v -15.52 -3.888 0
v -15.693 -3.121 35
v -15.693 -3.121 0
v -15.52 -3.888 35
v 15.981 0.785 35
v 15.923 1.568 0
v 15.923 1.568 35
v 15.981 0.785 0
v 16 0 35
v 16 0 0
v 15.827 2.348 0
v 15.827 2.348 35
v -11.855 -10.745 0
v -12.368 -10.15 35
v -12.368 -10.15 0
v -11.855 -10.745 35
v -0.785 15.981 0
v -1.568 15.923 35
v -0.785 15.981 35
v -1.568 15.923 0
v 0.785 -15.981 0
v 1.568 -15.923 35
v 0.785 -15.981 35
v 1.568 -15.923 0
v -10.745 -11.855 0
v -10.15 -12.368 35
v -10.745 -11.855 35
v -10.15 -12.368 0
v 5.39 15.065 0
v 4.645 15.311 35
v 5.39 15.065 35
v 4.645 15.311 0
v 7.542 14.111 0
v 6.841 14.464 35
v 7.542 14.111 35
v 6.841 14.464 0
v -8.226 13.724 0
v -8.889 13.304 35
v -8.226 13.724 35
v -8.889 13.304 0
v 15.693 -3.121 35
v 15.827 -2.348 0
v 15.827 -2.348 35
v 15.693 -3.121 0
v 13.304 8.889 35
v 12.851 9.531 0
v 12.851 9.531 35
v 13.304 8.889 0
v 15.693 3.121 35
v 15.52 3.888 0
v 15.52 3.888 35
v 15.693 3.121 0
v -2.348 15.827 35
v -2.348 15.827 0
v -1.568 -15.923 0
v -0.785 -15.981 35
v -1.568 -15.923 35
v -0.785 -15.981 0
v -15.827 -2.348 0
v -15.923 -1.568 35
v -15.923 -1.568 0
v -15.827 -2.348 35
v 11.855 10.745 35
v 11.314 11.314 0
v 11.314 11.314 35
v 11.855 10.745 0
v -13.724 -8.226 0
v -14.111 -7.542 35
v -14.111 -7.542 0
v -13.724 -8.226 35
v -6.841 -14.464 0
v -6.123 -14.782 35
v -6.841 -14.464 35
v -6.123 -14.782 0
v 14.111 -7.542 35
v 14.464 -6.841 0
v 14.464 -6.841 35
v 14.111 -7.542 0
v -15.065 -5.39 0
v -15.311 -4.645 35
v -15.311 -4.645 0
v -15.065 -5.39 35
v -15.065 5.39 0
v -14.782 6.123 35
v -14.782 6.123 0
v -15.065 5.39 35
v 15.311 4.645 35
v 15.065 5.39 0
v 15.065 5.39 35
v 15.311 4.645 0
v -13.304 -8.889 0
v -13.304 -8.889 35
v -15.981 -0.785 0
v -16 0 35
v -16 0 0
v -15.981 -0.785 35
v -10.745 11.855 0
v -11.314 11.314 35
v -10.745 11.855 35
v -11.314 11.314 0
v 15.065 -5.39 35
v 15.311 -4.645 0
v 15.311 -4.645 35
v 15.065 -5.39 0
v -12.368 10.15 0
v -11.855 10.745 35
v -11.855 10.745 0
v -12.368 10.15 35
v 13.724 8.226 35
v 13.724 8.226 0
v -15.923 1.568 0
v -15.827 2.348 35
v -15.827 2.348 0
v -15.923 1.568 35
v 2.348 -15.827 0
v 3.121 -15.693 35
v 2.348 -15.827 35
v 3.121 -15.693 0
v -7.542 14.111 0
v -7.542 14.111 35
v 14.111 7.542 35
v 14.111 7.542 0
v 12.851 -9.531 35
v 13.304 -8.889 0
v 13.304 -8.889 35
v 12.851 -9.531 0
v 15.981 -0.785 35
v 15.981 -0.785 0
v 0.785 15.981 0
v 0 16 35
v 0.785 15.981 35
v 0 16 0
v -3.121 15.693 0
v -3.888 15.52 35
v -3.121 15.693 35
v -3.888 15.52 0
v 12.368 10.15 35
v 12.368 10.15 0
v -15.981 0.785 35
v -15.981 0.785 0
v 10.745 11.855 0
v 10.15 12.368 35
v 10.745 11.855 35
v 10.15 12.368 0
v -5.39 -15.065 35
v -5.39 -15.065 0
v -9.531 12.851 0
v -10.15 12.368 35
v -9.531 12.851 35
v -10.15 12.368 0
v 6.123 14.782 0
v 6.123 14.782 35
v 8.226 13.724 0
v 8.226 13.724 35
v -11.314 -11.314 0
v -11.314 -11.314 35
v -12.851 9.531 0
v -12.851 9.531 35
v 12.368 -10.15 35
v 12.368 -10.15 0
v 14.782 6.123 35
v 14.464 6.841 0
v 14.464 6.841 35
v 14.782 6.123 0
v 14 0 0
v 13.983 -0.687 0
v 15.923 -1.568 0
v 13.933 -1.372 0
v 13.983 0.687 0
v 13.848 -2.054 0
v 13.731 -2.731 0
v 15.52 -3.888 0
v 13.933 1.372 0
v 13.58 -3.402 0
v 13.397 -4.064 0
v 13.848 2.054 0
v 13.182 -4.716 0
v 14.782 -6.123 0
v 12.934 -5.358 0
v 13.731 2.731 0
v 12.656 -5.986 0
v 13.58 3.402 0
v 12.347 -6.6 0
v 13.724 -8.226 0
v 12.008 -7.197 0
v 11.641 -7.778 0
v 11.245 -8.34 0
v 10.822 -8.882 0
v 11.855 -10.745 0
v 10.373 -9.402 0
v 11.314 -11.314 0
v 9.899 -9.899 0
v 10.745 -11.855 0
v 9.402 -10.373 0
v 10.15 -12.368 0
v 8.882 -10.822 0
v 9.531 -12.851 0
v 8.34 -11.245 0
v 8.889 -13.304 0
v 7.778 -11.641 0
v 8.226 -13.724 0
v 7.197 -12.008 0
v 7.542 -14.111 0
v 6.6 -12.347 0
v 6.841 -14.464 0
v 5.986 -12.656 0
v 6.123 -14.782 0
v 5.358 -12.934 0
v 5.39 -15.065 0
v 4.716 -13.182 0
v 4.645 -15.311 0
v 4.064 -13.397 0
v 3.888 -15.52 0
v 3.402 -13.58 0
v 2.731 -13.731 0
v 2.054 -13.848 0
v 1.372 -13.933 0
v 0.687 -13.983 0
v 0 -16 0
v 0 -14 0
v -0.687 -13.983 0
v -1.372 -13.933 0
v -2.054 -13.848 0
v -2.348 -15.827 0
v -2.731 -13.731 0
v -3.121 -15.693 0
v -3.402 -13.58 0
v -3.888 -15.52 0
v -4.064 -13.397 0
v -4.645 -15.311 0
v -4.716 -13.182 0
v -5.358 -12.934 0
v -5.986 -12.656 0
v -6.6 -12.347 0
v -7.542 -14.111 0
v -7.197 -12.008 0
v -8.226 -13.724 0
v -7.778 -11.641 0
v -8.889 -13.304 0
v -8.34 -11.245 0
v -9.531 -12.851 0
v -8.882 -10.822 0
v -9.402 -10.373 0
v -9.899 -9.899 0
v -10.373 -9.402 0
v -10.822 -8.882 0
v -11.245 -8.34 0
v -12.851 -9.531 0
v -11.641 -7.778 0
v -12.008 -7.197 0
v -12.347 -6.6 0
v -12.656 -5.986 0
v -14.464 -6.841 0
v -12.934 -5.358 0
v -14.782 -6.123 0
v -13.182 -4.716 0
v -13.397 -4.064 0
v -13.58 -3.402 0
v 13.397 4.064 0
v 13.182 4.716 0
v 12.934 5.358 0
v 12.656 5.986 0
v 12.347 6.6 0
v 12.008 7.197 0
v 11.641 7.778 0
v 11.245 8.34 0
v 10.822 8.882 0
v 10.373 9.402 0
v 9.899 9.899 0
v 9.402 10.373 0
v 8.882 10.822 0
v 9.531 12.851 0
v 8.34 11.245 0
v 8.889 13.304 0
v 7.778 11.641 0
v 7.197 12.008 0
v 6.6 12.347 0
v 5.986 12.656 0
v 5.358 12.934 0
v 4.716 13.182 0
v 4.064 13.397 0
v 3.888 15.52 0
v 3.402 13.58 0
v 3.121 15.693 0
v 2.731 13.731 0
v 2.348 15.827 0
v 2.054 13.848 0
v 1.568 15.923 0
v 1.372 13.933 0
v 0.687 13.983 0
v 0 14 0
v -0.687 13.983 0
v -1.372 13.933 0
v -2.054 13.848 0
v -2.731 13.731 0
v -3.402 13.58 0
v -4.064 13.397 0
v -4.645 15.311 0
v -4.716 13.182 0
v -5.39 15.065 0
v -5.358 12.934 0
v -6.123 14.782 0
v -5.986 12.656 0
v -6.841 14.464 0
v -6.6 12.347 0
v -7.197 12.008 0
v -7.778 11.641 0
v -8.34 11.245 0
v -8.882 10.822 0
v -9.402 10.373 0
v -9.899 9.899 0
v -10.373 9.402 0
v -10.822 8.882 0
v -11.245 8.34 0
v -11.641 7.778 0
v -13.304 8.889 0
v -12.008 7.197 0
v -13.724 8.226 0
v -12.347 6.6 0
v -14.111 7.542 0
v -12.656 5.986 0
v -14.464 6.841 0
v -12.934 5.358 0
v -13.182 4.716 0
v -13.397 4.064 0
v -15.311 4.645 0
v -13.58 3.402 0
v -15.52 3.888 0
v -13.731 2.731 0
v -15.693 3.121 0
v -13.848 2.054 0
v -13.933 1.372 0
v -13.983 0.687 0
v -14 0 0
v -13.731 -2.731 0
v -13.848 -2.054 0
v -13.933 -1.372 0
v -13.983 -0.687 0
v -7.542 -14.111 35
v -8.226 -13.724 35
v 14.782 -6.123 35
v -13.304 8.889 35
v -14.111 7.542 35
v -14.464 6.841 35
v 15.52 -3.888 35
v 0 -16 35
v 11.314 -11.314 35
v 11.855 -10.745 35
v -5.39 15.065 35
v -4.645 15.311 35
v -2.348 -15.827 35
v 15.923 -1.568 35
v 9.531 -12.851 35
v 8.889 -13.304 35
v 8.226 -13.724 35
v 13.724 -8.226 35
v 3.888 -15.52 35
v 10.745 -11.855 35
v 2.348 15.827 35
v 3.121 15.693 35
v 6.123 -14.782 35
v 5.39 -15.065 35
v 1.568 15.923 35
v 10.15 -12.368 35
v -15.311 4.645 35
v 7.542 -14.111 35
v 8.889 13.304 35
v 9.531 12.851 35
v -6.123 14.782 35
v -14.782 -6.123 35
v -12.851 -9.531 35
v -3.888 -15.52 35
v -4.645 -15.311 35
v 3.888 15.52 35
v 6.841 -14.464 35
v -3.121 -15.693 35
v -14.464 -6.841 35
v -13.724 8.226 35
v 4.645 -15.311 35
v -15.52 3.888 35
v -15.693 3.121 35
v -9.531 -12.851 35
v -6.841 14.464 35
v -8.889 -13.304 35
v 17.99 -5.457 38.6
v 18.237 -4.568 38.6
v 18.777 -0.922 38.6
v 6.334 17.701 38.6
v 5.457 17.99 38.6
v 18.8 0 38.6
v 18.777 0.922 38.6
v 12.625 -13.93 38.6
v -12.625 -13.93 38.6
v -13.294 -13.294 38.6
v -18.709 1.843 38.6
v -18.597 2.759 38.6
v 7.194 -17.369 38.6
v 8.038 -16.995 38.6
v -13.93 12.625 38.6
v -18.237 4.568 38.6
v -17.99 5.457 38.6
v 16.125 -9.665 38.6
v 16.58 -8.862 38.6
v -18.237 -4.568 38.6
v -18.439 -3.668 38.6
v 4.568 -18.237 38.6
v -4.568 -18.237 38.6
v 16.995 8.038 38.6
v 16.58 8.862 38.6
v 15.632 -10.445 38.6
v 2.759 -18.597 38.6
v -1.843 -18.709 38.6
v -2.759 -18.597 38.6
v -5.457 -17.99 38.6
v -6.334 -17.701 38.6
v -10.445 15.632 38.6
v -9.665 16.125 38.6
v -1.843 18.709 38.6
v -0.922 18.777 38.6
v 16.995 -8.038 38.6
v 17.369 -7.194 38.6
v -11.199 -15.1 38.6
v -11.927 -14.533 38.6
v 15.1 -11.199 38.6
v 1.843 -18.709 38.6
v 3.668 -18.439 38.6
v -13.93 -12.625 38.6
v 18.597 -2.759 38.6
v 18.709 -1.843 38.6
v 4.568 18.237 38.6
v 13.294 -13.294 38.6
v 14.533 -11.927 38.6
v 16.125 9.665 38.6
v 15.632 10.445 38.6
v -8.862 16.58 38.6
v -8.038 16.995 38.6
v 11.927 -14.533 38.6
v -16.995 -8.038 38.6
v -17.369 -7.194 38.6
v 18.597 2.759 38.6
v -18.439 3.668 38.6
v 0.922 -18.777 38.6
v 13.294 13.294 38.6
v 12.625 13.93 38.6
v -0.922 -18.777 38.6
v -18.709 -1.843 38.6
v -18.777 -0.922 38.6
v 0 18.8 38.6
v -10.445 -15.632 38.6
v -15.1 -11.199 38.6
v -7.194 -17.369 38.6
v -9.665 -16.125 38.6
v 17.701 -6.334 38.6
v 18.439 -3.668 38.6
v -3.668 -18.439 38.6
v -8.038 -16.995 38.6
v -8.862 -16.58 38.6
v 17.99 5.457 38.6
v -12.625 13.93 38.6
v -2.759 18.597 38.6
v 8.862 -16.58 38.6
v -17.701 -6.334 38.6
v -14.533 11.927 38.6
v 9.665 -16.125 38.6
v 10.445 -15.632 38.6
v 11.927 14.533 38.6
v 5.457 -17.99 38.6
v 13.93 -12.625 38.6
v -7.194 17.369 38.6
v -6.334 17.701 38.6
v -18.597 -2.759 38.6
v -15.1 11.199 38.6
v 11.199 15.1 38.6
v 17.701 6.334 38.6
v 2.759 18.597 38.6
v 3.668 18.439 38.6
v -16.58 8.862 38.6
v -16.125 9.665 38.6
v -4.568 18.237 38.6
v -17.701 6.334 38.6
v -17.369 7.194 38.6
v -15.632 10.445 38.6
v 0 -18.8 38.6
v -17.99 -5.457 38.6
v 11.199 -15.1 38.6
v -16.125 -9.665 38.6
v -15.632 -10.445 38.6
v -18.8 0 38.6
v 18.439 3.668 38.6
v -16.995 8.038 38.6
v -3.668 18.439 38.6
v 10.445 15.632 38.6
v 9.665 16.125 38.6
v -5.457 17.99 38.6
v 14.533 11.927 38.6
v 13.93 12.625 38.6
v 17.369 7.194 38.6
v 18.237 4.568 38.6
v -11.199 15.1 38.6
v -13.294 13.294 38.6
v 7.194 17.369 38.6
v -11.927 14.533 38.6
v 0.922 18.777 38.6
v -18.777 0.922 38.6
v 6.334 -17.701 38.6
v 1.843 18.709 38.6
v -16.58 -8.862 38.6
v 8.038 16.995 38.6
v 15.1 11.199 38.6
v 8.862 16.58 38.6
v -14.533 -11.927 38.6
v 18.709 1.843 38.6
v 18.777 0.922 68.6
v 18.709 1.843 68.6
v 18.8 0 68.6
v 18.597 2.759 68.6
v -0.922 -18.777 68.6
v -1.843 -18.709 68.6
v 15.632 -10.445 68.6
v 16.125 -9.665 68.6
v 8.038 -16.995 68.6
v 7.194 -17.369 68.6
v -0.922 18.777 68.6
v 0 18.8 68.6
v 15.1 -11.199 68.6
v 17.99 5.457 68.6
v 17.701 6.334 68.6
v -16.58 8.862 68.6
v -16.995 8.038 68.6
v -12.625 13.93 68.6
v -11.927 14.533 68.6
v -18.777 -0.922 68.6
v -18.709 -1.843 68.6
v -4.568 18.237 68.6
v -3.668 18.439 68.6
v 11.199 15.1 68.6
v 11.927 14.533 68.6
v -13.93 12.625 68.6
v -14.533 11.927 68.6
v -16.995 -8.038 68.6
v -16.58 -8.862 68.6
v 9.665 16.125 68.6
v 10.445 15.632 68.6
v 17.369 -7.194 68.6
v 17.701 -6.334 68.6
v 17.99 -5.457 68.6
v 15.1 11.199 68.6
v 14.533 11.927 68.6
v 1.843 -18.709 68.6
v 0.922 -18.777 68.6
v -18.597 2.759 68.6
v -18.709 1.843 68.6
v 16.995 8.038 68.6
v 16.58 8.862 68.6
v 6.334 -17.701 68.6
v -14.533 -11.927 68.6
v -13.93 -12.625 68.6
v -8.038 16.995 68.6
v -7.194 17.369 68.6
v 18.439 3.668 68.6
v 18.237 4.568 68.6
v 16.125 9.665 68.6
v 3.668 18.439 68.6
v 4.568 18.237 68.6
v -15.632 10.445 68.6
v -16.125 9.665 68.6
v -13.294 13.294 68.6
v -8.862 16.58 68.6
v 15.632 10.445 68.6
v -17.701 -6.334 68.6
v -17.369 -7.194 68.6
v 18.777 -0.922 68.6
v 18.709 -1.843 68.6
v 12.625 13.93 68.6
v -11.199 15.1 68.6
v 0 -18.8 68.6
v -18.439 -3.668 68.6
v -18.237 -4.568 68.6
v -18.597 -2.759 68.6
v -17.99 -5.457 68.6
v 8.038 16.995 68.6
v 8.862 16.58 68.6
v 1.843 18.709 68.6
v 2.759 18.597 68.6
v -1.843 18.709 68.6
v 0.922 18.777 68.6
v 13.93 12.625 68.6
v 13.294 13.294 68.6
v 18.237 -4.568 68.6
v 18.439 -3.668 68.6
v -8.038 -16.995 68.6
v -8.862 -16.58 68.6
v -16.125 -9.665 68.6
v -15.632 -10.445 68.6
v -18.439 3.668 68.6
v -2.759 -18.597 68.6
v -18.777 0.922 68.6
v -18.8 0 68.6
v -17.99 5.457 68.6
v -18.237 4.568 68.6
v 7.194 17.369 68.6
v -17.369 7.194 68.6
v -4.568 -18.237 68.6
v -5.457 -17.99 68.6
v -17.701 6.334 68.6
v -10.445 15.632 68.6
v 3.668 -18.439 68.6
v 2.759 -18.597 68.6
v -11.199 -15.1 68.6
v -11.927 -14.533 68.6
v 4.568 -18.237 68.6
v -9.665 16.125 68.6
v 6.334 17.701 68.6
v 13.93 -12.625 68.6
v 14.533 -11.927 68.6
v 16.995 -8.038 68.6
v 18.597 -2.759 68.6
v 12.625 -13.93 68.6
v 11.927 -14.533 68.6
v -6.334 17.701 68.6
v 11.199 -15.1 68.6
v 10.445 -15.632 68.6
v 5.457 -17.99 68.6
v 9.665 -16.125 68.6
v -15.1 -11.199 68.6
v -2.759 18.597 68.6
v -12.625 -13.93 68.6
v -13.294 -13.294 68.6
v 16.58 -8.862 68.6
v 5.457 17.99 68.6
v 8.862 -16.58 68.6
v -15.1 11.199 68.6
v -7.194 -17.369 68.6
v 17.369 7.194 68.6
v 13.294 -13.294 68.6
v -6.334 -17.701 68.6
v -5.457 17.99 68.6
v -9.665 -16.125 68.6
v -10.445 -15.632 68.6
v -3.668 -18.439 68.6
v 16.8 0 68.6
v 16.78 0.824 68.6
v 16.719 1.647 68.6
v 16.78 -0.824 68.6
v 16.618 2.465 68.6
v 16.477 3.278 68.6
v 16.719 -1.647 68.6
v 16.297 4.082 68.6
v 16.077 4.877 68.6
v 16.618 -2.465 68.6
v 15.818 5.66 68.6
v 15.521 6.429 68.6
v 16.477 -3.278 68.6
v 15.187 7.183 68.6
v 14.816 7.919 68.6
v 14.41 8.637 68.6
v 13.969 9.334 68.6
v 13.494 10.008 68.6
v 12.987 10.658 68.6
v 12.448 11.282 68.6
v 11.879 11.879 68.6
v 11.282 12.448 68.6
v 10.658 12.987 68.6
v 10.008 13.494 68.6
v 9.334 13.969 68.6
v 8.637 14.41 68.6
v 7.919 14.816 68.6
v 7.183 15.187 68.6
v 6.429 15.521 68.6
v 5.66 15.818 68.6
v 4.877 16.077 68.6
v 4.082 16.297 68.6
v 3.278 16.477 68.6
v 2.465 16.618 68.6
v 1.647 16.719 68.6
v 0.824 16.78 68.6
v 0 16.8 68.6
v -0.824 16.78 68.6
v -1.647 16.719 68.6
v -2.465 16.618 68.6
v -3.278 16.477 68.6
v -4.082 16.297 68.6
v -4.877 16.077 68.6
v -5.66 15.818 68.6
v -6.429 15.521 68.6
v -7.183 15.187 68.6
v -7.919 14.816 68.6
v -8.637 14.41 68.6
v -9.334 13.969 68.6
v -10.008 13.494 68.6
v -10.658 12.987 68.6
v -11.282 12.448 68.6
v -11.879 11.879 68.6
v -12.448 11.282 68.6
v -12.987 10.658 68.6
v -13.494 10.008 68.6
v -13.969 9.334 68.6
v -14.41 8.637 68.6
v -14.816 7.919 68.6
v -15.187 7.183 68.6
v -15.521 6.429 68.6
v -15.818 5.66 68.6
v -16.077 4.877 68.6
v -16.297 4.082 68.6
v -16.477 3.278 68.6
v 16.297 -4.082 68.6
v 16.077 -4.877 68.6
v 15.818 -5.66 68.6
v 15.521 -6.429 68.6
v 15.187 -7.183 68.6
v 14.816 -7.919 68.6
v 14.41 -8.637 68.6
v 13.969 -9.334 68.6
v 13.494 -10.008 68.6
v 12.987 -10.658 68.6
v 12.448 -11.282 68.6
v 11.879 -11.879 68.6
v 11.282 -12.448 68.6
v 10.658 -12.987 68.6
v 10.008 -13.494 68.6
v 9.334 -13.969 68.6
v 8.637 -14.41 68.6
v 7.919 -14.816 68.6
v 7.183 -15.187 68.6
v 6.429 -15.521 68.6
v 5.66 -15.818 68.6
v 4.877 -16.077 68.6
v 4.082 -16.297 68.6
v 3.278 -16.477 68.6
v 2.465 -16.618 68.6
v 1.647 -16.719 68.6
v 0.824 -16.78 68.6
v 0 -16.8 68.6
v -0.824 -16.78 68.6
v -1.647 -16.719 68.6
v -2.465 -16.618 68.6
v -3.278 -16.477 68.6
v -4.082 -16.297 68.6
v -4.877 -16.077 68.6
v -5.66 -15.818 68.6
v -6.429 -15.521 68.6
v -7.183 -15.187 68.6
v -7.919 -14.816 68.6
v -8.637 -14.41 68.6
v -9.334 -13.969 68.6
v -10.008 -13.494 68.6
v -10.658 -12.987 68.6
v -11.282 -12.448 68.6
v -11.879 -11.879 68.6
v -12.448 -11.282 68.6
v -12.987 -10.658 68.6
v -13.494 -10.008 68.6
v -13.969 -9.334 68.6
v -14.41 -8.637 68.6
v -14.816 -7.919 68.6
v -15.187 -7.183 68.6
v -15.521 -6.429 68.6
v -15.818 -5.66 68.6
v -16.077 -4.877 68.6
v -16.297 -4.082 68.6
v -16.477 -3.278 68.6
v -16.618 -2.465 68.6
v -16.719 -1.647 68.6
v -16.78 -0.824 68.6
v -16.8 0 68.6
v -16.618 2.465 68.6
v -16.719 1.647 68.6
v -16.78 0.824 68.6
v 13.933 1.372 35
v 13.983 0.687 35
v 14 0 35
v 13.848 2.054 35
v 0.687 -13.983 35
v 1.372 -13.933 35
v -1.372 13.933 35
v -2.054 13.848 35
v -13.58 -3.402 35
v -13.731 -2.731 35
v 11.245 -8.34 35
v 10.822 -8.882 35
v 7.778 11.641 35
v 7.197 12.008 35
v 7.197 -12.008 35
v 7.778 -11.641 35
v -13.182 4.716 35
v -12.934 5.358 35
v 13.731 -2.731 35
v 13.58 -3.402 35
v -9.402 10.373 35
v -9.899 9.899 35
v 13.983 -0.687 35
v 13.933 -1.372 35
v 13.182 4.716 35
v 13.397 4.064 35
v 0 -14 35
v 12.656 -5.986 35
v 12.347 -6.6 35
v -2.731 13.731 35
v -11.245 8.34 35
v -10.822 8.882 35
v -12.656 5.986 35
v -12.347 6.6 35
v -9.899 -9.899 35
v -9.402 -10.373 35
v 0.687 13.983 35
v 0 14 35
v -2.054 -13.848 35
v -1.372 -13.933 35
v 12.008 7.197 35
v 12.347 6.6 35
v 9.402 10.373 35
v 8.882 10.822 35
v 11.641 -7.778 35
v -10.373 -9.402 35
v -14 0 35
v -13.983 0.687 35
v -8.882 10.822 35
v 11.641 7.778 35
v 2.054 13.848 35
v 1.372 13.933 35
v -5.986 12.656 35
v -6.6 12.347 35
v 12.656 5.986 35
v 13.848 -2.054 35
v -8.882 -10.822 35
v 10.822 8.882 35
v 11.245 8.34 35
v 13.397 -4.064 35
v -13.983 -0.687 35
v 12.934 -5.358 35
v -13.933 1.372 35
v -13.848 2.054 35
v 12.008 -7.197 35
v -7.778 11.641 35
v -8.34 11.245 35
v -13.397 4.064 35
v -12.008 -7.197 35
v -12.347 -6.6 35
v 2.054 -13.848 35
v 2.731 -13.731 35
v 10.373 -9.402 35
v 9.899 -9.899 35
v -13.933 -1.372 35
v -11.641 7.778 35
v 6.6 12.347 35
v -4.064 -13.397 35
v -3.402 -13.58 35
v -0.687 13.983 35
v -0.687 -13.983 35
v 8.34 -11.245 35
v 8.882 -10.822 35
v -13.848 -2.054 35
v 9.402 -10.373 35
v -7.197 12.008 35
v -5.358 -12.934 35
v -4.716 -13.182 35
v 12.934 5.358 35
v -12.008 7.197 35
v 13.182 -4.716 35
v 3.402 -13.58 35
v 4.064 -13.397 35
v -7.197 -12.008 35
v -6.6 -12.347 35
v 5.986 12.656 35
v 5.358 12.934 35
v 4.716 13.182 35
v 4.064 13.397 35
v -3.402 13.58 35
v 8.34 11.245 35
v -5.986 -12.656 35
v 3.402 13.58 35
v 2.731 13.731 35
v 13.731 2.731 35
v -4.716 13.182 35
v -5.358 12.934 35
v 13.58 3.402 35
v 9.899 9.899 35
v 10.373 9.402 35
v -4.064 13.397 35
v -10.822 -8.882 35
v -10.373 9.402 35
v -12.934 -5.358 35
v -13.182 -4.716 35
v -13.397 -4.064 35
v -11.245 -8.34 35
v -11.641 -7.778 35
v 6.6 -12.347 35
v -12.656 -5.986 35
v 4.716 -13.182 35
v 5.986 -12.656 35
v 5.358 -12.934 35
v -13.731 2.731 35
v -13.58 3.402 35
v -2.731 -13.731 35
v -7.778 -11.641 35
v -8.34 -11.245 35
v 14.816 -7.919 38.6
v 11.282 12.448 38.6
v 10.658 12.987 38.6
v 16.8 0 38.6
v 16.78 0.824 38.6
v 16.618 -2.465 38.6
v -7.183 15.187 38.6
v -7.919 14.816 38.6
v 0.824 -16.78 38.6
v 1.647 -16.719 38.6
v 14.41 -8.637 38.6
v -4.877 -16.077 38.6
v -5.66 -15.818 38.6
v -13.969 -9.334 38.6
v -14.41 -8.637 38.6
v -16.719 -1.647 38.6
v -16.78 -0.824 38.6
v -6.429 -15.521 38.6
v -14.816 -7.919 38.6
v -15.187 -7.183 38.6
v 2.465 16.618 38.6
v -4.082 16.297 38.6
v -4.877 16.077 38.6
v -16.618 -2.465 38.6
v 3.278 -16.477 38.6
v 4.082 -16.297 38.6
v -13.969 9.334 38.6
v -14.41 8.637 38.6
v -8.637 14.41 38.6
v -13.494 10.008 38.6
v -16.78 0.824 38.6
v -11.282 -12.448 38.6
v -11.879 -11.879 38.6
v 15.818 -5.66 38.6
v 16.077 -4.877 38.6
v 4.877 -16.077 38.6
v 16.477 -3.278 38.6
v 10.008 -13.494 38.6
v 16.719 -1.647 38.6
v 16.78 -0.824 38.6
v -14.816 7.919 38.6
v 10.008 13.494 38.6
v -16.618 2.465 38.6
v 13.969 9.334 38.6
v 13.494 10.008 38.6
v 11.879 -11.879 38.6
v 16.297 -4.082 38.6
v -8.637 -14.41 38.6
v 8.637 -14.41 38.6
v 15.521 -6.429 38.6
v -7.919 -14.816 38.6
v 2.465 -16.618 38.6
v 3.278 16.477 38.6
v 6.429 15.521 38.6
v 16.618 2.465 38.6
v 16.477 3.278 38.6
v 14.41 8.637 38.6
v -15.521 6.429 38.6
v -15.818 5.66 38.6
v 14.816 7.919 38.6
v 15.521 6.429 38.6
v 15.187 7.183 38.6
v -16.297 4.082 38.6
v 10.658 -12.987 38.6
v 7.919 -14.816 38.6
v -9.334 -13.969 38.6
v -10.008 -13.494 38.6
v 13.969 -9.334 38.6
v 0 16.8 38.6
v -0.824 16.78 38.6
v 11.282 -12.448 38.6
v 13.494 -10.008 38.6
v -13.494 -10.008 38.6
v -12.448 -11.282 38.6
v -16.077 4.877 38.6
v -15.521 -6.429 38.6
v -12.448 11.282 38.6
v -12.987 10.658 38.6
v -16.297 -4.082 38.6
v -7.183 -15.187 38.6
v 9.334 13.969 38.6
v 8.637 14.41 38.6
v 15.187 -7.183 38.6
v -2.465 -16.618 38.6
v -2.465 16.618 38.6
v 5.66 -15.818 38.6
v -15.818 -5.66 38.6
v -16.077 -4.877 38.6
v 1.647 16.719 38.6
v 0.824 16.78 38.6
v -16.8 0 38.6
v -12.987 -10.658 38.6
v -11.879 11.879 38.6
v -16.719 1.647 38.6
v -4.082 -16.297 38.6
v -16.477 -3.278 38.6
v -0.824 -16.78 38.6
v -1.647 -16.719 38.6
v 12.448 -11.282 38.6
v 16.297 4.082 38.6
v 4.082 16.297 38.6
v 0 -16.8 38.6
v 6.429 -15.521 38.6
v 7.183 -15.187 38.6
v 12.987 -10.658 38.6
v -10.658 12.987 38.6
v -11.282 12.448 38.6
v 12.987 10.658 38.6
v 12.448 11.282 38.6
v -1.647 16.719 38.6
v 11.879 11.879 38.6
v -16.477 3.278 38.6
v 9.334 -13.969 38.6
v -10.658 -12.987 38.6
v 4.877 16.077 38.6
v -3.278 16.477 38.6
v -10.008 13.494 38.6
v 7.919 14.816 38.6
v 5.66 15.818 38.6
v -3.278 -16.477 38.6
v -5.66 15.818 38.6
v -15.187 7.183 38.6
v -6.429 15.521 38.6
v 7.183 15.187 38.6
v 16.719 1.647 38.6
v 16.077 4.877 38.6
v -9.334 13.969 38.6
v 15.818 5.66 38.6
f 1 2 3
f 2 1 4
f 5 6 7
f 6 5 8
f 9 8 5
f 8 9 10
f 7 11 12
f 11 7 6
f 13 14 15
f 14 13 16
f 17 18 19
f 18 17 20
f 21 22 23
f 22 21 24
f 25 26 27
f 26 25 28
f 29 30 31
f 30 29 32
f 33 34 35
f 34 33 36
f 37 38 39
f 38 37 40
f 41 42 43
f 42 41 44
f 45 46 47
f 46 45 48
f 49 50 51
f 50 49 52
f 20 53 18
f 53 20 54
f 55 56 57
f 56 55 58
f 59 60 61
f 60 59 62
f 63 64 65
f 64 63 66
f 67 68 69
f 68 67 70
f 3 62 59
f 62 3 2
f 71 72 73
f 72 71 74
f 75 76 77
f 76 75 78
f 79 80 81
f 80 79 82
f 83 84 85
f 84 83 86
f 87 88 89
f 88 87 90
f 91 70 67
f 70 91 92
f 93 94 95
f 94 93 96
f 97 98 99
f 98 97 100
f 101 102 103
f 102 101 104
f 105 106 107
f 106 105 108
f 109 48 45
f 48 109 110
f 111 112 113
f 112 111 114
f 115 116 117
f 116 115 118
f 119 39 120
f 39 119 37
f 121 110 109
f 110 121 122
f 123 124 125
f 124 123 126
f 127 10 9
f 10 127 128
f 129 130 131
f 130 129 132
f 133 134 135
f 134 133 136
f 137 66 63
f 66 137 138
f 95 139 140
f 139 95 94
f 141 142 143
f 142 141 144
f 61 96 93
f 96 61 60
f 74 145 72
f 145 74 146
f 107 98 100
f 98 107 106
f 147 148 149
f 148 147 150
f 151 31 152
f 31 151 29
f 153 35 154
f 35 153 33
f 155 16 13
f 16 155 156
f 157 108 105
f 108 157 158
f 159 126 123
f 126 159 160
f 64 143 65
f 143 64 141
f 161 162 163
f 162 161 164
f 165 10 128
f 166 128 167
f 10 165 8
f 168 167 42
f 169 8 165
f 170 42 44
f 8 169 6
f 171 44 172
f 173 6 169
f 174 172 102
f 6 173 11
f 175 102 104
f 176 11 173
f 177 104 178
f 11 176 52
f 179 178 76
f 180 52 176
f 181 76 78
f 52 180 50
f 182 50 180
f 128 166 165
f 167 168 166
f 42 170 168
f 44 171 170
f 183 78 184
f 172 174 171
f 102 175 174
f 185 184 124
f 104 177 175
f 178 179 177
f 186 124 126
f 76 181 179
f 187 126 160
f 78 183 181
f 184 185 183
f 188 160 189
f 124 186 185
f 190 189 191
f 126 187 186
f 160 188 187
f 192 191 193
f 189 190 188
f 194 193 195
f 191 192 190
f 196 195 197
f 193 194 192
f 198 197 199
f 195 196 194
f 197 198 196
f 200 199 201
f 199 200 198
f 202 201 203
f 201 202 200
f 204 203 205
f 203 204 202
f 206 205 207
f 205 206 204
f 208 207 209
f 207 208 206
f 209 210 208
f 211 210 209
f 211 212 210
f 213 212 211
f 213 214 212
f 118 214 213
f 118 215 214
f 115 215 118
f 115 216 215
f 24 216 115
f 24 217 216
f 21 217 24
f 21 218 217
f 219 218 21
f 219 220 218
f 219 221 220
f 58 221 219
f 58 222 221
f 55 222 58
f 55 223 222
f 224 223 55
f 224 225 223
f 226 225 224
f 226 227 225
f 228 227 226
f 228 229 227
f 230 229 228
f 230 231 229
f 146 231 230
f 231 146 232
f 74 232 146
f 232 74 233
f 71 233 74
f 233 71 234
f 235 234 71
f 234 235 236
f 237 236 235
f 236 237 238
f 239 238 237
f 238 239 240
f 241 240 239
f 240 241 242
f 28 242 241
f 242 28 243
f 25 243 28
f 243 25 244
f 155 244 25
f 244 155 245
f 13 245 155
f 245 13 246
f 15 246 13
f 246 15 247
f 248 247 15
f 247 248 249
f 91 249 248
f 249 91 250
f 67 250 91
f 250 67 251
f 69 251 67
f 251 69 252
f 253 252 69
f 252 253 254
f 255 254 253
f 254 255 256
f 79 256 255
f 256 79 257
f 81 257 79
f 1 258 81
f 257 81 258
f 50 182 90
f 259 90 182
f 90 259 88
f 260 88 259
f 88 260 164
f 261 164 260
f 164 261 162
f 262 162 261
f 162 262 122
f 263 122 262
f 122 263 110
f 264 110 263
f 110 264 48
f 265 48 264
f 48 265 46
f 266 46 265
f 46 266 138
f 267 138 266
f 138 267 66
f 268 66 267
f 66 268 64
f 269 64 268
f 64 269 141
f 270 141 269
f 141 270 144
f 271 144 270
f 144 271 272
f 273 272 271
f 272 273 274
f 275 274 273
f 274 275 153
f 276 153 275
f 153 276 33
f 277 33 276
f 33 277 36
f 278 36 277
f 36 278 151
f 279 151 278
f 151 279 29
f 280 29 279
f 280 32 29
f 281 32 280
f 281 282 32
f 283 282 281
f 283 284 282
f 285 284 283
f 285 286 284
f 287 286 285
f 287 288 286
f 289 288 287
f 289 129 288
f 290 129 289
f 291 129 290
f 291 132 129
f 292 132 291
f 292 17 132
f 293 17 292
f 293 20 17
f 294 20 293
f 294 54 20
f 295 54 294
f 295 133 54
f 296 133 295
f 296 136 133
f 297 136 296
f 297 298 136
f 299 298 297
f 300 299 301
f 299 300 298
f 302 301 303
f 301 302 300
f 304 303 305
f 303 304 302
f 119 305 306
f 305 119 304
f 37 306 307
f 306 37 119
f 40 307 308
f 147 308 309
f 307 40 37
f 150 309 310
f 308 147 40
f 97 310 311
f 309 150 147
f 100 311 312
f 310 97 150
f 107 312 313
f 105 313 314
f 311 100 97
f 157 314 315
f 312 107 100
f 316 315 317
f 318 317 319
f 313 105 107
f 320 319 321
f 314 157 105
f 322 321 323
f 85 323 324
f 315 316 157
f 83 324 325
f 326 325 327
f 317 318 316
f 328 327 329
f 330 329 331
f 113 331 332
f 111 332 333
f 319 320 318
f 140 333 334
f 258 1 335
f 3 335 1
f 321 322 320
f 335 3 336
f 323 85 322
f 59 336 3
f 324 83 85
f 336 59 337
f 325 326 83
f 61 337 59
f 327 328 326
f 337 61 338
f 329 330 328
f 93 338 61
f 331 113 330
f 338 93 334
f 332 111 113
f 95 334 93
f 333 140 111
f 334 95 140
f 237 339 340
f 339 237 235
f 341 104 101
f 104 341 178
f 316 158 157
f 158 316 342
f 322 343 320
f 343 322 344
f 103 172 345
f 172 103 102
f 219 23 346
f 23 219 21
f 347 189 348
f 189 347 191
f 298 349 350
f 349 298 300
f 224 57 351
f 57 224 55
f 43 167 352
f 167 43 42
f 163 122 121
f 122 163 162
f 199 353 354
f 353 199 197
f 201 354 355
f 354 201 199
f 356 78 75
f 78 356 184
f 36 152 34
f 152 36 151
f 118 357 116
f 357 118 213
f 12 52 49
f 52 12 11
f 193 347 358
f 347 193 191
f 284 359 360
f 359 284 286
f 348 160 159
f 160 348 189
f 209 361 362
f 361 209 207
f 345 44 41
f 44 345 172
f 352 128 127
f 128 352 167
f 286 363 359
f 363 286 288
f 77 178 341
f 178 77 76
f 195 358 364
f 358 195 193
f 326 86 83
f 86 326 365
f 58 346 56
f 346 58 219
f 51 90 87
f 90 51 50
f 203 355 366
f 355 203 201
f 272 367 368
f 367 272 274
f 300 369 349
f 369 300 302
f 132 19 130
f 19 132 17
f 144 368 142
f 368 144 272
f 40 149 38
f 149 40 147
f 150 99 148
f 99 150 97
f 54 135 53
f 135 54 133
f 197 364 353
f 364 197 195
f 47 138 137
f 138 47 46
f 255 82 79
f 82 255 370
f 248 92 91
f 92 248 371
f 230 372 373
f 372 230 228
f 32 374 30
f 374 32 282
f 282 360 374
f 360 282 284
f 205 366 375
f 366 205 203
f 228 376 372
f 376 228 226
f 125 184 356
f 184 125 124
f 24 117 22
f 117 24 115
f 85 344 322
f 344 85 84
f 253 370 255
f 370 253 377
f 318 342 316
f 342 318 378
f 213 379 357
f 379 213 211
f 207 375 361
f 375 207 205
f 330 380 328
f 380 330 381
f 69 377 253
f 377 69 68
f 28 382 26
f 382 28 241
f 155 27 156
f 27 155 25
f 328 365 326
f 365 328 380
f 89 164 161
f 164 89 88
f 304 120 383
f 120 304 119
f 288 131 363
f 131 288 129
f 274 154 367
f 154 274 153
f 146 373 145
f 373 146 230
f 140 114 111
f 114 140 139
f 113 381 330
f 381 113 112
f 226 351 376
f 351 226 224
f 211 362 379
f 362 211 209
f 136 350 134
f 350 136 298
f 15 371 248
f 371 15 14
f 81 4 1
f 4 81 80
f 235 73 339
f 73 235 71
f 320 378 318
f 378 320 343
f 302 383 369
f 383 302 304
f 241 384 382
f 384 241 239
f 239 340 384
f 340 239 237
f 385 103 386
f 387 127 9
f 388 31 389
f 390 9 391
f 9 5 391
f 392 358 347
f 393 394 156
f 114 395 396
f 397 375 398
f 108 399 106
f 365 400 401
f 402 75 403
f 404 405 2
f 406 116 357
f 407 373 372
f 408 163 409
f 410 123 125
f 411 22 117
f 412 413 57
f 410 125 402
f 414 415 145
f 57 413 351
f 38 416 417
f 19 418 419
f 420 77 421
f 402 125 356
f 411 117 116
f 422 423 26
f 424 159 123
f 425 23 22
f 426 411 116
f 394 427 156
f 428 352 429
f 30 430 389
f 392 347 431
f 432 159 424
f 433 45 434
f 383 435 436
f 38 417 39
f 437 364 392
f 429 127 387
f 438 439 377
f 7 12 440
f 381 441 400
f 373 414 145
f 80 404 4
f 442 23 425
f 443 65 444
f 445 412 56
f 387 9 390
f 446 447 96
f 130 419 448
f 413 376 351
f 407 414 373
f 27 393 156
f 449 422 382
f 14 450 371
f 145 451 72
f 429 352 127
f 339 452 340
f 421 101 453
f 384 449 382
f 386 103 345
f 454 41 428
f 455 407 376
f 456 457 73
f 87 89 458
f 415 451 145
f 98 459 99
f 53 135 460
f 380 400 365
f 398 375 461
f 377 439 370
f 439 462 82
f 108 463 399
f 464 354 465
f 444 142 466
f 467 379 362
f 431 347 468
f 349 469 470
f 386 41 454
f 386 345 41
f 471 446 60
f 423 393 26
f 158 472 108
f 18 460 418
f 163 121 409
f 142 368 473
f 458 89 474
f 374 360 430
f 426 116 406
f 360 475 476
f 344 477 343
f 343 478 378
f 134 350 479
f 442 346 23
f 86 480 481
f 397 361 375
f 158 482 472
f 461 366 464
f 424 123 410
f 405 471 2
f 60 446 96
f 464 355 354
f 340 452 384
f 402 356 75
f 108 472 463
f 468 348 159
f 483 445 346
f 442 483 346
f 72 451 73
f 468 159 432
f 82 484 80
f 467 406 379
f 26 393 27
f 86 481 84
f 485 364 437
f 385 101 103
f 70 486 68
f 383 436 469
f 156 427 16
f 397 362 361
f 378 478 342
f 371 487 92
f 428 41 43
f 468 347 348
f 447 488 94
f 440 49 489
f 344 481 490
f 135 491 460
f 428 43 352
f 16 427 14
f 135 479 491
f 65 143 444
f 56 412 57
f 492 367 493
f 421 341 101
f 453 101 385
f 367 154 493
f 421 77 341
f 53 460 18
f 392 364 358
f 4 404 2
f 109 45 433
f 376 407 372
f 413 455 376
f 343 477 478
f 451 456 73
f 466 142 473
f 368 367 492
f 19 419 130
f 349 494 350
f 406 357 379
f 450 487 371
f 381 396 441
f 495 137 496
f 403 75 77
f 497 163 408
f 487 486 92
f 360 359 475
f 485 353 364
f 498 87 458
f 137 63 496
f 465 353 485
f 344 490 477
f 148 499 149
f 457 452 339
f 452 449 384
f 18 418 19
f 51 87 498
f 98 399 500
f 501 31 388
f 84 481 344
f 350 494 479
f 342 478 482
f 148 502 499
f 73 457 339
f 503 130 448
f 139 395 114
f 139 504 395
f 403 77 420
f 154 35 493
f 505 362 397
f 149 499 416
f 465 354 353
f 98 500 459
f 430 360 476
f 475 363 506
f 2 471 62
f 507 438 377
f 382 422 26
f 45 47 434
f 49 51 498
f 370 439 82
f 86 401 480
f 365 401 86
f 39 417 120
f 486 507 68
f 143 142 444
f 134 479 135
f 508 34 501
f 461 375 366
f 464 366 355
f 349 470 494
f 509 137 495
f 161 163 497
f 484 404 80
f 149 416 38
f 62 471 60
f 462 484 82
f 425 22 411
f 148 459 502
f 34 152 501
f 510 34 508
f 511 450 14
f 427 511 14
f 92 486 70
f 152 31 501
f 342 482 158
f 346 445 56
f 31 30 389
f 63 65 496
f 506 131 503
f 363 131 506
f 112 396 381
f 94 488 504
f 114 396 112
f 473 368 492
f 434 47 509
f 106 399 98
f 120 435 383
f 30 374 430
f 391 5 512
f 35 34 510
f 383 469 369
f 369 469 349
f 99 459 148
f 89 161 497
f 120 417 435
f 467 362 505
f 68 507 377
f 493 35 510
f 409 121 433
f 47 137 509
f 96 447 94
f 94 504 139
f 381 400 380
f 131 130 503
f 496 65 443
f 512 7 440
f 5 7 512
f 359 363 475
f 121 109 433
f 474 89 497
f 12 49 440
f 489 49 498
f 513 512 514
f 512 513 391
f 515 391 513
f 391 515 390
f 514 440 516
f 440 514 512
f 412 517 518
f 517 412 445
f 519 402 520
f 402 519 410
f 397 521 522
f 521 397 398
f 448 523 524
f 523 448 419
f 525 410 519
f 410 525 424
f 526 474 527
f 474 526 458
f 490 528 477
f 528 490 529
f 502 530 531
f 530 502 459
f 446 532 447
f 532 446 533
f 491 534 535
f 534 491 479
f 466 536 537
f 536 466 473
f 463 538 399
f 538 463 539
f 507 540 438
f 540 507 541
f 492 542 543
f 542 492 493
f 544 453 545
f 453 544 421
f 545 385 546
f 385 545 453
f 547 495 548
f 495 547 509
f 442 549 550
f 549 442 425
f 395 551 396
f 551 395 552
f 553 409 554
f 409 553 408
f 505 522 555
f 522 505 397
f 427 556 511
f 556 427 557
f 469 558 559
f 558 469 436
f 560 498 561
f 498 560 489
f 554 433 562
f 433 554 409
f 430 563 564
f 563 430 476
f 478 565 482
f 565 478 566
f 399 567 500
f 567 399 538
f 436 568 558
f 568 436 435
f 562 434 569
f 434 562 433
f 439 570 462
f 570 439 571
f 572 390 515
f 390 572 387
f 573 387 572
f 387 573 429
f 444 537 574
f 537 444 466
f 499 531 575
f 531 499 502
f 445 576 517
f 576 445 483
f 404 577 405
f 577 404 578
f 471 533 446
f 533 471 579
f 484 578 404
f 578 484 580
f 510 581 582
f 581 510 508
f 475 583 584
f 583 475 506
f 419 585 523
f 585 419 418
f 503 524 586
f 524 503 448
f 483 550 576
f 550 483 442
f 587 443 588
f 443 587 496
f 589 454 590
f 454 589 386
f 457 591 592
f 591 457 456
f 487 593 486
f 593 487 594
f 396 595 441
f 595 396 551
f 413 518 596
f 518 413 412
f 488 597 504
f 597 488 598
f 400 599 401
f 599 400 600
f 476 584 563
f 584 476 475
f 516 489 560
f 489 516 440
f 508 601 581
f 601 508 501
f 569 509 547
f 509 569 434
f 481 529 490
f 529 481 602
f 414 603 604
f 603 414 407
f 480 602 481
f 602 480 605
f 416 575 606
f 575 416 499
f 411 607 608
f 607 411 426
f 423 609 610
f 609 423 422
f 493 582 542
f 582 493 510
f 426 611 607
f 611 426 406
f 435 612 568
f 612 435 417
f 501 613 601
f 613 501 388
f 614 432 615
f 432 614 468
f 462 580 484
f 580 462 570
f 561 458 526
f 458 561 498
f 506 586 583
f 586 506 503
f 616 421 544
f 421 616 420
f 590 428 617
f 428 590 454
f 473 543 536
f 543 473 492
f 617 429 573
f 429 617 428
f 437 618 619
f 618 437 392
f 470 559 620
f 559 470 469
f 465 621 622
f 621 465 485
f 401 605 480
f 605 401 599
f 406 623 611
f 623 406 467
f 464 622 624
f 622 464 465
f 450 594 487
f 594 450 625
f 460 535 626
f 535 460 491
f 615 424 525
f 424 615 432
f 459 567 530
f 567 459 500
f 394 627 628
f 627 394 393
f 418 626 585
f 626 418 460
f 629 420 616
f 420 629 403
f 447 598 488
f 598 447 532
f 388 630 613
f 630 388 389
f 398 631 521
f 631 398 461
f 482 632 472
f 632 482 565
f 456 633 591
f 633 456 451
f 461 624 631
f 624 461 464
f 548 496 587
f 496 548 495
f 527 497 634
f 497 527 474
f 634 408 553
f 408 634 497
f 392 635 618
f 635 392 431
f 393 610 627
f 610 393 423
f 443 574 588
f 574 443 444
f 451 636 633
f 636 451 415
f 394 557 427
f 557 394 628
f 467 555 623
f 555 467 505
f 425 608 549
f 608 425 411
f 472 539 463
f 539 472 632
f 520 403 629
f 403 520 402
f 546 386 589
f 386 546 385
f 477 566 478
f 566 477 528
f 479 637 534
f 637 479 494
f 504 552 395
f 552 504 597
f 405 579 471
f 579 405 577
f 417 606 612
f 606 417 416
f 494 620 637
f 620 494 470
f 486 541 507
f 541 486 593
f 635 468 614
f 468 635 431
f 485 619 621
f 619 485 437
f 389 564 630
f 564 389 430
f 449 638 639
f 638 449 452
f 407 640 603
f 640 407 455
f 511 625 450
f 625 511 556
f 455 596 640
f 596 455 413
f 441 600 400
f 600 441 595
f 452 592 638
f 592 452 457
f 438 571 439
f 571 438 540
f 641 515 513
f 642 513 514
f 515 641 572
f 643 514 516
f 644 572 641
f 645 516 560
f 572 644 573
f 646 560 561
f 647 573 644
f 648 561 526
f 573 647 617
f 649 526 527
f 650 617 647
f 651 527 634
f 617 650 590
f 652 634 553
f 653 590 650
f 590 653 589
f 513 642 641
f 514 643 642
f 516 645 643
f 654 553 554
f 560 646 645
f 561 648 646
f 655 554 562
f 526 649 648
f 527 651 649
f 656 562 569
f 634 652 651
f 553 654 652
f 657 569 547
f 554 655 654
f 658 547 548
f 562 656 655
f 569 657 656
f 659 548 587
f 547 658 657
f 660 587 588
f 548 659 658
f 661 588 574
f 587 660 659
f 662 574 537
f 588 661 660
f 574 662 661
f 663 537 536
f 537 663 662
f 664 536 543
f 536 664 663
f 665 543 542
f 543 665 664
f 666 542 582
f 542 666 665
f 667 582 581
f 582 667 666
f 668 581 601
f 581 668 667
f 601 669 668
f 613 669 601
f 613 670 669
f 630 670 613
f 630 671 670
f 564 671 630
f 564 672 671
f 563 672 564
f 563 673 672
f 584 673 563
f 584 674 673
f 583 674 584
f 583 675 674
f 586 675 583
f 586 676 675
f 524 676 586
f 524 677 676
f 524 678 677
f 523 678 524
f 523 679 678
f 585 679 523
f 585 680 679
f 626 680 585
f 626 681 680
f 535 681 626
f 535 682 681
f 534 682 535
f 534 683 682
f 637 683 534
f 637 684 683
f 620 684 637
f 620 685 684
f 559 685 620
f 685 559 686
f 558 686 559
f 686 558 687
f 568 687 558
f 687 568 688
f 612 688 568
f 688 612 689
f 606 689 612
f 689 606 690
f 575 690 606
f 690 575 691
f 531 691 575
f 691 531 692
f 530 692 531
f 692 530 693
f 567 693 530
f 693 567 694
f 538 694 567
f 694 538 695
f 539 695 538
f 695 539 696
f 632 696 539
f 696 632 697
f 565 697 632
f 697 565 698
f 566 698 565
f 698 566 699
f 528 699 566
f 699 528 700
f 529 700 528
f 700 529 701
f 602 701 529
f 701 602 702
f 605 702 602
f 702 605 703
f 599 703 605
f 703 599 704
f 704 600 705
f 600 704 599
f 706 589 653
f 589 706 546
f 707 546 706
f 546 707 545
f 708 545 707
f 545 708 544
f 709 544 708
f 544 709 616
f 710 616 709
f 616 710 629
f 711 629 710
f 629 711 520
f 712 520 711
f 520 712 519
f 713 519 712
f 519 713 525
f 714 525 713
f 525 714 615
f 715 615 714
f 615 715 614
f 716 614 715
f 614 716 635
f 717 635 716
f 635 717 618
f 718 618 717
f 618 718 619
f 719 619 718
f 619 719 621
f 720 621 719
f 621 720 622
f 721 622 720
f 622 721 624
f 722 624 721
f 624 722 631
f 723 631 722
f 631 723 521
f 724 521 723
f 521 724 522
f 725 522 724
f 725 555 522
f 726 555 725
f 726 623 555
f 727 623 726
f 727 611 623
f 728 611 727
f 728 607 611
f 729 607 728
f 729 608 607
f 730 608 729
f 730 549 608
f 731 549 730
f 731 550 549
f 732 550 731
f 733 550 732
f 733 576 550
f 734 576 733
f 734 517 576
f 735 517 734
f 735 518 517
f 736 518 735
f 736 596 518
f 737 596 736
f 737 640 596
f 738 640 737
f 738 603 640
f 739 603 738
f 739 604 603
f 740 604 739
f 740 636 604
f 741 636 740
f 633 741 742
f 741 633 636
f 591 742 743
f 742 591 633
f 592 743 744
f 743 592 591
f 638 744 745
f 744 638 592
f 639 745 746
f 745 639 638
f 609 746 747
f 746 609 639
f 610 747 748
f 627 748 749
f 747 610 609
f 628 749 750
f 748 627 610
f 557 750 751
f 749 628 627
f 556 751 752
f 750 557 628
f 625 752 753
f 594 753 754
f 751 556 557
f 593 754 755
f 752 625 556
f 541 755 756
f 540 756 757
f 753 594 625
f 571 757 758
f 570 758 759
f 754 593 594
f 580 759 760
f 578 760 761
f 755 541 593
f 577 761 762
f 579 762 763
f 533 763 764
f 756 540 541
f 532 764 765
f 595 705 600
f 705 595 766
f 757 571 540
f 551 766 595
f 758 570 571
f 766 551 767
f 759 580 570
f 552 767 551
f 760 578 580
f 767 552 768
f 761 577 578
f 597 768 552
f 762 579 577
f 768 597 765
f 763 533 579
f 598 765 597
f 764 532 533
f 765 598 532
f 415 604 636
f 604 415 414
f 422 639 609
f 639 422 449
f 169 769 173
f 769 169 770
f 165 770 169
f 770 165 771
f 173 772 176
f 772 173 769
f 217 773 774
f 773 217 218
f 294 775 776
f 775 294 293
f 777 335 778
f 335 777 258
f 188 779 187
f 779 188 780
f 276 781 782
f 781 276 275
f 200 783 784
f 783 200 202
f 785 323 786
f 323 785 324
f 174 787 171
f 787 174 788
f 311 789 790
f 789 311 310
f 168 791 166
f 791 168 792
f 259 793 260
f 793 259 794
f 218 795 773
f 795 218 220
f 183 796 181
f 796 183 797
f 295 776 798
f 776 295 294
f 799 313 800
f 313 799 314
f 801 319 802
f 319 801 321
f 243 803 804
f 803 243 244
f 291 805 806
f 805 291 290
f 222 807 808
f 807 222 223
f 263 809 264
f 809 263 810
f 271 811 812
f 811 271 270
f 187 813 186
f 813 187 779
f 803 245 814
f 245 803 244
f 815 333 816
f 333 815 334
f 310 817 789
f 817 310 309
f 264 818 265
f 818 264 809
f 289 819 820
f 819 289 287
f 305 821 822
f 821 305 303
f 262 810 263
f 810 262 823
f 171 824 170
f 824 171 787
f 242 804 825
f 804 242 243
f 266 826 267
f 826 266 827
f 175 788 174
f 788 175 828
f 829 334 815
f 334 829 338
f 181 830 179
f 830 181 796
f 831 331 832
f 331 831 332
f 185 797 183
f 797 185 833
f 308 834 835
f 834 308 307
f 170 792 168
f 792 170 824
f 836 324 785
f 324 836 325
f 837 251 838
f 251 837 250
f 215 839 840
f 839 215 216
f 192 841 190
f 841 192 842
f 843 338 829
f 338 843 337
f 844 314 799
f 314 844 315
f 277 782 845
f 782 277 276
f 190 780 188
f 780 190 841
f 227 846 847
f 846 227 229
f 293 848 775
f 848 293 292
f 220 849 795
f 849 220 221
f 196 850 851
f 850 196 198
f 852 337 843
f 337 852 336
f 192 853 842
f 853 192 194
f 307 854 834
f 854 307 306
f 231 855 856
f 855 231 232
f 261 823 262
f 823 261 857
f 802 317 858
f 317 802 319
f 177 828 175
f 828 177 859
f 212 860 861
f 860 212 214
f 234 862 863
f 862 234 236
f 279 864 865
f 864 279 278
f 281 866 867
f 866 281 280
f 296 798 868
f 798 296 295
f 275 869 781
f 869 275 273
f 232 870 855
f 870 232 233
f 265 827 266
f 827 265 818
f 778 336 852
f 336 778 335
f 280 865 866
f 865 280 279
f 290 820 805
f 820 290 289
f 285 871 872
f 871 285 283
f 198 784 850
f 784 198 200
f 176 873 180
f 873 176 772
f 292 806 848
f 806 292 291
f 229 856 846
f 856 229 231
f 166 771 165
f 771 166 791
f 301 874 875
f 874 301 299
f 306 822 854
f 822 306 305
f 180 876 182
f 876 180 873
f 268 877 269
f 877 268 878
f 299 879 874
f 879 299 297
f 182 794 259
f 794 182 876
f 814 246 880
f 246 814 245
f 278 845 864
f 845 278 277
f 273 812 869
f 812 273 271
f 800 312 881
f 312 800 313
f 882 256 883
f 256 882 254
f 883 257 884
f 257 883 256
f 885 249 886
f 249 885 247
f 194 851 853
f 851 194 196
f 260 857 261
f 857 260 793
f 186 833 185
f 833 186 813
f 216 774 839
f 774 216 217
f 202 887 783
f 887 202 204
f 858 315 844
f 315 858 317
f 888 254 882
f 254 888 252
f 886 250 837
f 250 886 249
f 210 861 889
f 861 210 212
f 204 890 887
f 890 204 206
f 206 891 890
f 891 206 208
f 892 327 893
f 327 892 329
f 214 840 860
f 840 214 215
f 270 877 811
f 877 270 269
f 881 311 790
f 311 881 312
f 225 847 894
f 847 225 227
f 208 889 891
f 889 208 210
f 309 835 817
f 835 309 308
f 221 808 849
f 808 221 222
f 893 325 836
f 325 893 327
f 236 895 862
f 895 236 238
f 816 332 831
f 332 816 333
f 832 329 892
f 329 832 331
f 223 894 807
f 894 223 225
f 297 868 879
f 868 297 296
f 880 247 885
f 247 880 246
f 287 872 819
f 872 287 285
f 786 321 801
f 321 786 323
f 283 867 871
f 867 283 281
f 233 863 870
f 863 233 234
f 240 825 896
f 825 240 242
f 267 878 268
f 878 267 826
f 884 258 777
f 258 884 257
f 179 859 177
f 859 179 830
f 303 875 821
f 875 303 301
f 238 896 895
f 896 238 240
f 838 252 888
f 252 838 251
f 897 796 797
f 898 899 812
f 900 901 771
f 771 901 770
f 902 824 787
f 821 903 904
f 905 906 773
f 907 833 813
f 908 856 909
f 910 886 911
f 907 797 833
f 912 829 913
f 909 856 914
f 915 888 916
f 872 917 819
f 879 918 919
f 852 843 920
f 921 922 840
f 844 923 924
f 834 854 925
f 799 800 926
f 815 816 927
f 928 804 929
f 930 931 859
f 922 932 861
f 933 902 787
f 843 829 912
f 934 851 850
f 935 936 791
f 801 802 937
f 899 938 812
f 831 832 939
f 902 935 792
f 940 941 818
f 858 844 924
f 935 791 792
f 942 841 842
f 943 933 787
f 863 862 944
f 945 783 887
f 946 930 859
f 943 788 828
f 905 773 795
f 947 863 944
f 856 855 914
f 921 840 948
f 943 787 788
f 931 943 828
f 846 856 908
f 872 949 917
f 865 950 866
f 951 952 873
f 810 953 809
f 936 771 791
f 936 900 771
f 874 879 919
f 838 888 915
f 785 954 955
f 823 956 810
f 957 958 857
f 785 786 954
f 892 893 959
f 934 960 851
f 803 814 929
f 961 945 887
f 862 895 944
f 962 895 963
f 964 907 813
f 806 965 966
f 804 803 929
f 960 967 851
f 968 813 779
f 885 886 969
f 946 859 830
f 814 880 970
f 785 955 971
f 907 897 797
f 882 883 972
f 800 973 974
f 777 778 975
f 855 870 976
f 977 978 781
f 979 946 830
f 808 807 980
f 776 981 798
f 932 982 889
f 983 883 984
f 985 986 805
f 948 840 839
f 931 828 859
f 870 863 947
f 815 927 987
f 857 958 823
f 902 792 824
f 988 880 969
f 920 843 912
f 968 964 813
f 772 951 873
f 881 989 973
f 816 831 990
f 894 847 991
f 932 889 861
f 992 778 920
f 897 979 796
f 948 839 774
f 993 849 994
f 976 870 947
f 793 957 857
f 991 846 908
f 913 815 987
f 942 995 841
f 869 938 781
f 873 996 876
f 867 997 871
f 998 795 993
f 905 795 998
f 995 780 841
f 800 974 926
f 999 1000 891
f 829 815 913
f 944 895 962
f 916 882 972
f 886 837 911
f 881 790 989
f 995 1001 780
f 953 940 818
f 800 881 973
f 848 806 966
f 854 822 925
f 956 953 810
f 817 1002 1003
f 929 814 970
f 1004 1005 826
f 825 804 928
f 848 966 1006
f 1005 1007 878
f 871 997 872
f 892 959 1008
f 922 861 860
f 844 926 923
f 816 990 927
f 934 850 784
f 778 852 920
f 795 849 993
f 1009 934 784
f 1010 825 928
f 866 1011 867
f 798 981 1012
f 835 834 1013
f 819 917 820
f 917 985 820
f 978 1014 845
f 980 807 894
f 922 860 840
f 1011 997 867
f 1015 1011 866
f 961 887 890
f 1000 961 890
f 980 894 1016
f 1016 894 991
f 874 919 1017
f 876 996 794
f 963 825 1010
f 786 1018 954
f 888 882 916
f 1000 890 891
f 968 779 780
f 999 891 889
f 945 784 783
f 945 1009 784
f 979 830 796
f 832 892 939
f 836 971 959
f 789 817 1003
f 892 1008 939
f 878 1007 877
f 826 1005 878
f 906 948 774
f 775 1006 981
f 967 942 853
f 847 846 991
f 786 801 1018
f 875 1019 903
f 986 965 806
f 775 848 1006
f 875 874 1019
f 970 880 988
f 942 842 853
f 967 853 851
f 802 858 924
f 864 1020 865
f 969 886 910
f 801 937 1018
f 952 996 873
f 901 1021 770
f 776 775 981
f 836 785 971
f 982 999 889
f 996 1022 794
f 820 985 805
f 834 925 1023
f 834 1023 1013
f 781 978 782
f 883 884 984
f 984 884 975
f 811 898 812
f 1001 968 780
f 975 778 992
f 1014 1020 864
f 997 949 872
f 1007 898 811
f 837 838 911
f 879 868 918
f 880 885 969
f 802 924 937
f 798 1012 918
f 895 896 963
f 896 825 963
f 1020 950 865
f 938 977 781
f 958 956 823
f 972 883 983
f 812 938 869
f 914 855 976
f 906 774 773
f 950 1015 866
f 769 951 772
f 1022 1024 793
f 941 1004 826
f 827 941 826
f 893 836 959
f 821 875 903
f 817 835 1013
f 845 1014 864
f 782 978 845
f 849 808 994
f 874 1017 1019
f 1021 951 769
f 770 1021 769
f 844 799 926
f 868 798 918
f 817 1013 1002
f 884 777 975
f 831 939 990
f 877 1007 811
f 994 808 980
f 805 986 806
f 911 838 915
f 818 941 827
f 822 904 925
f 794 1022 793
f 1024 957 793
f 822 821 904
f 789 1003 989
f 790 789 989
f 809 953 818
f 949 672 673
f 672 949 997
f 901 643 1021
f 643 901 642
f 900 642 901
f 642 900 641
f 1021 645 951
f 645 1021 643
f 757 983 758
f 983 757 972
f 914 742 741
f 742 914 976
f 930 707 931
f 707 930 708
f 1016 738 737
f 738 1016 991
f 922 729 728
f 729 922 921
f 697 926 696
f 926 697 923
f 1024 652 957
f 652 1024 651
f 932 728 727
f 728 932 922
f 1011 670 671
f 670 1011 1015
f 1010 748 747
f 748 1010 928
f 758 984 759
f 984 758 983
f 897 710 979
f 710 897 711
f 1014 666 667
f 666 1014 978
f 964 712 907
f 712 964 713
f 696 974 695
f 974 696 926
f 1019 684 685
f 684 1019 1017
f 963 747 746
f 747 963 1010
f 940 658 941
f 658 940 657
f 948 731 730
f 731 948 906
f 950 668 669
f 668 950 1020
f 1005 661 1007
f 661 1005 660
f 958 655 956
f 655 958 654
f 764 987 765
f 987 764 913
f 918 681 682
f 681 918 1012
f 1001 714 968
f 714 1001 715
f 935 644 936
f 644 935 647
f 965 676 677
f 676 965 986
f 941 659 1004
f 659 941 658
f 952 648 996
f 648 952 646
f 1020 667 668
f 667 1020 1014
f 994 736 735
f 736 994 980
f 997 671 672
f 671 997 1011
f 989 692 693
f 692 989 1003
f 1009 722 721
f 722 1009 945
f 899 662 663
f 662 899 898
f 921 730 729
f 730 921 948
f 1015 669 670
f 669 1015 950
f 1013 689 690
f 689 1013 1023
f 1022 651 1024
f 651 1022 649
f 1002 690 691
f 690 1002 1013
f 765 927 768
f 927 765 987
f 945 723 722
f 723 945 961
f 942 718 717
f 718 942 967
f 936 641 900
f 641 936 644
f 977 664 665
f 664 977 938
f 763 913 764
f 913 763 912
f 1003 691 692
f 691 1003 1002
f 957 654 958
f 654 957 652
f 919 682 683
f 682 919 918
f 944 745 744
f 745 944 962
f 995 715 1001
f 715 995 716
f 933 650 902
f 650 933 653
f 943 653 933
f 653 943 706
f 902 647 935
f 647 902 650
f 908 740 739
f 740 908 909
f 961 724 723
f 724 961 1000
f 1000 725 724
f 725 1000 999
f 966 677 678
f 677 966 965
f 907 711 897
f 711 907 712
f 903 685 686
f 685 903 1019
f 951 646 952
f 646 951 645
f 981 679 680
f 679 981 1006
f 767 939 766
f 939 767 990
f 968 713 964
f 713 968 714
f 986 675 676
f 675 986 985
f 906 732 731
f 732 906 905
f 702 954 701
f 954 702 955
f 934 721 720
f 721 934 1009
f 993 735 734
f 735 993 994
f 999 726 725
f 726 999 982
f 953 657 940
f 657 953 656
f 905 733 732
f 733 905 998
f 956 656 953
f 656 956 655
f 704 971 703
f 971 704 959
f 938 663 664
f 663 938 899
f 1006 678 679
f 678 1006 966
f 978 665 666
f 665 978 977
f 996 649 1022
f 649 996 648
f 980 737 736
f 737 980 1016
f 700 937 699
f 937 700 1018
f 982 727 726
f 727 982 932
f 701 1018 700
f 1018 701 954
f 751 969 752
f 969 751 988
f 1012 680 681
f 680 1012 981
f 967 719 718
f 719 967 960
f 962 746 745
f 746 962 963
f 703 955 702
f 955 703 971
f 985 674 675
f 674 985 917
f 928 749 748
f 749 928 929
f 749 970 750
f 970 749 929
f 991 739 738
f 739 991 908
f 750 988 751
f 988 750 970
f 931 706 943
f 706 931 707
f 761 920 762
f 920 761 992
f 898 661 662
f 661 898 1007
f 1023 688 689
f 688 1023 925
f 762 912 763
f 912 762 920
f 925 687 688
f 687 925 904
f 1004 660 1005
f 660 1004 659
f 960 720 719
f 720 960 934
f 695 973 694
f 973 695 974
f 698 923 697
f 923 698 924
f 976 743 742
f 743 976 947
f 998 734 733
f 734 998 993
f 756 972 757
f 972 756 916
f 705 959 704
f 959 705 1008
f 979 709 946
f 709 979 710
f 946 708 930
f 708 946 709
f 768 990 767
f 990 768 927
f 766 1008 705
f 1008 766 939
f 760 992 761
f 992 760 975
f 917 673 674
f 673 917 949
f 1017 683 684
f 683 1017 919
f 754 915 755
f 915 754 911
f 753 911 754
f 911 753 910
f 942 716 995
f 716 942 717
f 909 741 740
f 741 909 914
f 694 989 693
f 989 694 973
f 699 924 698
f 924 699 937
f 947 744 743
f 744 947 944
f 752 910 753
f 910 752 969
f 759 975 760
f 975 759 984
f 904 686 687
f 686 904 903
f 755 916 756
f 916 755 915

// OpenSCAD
$fn=128;

thickness=2;

difference() {
  union() {
    cylinder(h=35, d=32);
    // Create a ~45 deg overhang for printing.
    translate([0, 0, 35]) cylinder(h=3.6, d1=32, d2=37.6);
    translate([0, 0, 38.6]) cylinder(h=30, d=37.6);
  }
  union() {
    cylinder(h=35, d=32-thickness*2);
    translate([0, 0, 35]) cylinder(h=3.6, d1=32-thickness*2, d2=37.6-thickness*2);
    translate([0, 0, 38.6]) cylinder(h=30, d=37.6-thickness*2);
  }
}
